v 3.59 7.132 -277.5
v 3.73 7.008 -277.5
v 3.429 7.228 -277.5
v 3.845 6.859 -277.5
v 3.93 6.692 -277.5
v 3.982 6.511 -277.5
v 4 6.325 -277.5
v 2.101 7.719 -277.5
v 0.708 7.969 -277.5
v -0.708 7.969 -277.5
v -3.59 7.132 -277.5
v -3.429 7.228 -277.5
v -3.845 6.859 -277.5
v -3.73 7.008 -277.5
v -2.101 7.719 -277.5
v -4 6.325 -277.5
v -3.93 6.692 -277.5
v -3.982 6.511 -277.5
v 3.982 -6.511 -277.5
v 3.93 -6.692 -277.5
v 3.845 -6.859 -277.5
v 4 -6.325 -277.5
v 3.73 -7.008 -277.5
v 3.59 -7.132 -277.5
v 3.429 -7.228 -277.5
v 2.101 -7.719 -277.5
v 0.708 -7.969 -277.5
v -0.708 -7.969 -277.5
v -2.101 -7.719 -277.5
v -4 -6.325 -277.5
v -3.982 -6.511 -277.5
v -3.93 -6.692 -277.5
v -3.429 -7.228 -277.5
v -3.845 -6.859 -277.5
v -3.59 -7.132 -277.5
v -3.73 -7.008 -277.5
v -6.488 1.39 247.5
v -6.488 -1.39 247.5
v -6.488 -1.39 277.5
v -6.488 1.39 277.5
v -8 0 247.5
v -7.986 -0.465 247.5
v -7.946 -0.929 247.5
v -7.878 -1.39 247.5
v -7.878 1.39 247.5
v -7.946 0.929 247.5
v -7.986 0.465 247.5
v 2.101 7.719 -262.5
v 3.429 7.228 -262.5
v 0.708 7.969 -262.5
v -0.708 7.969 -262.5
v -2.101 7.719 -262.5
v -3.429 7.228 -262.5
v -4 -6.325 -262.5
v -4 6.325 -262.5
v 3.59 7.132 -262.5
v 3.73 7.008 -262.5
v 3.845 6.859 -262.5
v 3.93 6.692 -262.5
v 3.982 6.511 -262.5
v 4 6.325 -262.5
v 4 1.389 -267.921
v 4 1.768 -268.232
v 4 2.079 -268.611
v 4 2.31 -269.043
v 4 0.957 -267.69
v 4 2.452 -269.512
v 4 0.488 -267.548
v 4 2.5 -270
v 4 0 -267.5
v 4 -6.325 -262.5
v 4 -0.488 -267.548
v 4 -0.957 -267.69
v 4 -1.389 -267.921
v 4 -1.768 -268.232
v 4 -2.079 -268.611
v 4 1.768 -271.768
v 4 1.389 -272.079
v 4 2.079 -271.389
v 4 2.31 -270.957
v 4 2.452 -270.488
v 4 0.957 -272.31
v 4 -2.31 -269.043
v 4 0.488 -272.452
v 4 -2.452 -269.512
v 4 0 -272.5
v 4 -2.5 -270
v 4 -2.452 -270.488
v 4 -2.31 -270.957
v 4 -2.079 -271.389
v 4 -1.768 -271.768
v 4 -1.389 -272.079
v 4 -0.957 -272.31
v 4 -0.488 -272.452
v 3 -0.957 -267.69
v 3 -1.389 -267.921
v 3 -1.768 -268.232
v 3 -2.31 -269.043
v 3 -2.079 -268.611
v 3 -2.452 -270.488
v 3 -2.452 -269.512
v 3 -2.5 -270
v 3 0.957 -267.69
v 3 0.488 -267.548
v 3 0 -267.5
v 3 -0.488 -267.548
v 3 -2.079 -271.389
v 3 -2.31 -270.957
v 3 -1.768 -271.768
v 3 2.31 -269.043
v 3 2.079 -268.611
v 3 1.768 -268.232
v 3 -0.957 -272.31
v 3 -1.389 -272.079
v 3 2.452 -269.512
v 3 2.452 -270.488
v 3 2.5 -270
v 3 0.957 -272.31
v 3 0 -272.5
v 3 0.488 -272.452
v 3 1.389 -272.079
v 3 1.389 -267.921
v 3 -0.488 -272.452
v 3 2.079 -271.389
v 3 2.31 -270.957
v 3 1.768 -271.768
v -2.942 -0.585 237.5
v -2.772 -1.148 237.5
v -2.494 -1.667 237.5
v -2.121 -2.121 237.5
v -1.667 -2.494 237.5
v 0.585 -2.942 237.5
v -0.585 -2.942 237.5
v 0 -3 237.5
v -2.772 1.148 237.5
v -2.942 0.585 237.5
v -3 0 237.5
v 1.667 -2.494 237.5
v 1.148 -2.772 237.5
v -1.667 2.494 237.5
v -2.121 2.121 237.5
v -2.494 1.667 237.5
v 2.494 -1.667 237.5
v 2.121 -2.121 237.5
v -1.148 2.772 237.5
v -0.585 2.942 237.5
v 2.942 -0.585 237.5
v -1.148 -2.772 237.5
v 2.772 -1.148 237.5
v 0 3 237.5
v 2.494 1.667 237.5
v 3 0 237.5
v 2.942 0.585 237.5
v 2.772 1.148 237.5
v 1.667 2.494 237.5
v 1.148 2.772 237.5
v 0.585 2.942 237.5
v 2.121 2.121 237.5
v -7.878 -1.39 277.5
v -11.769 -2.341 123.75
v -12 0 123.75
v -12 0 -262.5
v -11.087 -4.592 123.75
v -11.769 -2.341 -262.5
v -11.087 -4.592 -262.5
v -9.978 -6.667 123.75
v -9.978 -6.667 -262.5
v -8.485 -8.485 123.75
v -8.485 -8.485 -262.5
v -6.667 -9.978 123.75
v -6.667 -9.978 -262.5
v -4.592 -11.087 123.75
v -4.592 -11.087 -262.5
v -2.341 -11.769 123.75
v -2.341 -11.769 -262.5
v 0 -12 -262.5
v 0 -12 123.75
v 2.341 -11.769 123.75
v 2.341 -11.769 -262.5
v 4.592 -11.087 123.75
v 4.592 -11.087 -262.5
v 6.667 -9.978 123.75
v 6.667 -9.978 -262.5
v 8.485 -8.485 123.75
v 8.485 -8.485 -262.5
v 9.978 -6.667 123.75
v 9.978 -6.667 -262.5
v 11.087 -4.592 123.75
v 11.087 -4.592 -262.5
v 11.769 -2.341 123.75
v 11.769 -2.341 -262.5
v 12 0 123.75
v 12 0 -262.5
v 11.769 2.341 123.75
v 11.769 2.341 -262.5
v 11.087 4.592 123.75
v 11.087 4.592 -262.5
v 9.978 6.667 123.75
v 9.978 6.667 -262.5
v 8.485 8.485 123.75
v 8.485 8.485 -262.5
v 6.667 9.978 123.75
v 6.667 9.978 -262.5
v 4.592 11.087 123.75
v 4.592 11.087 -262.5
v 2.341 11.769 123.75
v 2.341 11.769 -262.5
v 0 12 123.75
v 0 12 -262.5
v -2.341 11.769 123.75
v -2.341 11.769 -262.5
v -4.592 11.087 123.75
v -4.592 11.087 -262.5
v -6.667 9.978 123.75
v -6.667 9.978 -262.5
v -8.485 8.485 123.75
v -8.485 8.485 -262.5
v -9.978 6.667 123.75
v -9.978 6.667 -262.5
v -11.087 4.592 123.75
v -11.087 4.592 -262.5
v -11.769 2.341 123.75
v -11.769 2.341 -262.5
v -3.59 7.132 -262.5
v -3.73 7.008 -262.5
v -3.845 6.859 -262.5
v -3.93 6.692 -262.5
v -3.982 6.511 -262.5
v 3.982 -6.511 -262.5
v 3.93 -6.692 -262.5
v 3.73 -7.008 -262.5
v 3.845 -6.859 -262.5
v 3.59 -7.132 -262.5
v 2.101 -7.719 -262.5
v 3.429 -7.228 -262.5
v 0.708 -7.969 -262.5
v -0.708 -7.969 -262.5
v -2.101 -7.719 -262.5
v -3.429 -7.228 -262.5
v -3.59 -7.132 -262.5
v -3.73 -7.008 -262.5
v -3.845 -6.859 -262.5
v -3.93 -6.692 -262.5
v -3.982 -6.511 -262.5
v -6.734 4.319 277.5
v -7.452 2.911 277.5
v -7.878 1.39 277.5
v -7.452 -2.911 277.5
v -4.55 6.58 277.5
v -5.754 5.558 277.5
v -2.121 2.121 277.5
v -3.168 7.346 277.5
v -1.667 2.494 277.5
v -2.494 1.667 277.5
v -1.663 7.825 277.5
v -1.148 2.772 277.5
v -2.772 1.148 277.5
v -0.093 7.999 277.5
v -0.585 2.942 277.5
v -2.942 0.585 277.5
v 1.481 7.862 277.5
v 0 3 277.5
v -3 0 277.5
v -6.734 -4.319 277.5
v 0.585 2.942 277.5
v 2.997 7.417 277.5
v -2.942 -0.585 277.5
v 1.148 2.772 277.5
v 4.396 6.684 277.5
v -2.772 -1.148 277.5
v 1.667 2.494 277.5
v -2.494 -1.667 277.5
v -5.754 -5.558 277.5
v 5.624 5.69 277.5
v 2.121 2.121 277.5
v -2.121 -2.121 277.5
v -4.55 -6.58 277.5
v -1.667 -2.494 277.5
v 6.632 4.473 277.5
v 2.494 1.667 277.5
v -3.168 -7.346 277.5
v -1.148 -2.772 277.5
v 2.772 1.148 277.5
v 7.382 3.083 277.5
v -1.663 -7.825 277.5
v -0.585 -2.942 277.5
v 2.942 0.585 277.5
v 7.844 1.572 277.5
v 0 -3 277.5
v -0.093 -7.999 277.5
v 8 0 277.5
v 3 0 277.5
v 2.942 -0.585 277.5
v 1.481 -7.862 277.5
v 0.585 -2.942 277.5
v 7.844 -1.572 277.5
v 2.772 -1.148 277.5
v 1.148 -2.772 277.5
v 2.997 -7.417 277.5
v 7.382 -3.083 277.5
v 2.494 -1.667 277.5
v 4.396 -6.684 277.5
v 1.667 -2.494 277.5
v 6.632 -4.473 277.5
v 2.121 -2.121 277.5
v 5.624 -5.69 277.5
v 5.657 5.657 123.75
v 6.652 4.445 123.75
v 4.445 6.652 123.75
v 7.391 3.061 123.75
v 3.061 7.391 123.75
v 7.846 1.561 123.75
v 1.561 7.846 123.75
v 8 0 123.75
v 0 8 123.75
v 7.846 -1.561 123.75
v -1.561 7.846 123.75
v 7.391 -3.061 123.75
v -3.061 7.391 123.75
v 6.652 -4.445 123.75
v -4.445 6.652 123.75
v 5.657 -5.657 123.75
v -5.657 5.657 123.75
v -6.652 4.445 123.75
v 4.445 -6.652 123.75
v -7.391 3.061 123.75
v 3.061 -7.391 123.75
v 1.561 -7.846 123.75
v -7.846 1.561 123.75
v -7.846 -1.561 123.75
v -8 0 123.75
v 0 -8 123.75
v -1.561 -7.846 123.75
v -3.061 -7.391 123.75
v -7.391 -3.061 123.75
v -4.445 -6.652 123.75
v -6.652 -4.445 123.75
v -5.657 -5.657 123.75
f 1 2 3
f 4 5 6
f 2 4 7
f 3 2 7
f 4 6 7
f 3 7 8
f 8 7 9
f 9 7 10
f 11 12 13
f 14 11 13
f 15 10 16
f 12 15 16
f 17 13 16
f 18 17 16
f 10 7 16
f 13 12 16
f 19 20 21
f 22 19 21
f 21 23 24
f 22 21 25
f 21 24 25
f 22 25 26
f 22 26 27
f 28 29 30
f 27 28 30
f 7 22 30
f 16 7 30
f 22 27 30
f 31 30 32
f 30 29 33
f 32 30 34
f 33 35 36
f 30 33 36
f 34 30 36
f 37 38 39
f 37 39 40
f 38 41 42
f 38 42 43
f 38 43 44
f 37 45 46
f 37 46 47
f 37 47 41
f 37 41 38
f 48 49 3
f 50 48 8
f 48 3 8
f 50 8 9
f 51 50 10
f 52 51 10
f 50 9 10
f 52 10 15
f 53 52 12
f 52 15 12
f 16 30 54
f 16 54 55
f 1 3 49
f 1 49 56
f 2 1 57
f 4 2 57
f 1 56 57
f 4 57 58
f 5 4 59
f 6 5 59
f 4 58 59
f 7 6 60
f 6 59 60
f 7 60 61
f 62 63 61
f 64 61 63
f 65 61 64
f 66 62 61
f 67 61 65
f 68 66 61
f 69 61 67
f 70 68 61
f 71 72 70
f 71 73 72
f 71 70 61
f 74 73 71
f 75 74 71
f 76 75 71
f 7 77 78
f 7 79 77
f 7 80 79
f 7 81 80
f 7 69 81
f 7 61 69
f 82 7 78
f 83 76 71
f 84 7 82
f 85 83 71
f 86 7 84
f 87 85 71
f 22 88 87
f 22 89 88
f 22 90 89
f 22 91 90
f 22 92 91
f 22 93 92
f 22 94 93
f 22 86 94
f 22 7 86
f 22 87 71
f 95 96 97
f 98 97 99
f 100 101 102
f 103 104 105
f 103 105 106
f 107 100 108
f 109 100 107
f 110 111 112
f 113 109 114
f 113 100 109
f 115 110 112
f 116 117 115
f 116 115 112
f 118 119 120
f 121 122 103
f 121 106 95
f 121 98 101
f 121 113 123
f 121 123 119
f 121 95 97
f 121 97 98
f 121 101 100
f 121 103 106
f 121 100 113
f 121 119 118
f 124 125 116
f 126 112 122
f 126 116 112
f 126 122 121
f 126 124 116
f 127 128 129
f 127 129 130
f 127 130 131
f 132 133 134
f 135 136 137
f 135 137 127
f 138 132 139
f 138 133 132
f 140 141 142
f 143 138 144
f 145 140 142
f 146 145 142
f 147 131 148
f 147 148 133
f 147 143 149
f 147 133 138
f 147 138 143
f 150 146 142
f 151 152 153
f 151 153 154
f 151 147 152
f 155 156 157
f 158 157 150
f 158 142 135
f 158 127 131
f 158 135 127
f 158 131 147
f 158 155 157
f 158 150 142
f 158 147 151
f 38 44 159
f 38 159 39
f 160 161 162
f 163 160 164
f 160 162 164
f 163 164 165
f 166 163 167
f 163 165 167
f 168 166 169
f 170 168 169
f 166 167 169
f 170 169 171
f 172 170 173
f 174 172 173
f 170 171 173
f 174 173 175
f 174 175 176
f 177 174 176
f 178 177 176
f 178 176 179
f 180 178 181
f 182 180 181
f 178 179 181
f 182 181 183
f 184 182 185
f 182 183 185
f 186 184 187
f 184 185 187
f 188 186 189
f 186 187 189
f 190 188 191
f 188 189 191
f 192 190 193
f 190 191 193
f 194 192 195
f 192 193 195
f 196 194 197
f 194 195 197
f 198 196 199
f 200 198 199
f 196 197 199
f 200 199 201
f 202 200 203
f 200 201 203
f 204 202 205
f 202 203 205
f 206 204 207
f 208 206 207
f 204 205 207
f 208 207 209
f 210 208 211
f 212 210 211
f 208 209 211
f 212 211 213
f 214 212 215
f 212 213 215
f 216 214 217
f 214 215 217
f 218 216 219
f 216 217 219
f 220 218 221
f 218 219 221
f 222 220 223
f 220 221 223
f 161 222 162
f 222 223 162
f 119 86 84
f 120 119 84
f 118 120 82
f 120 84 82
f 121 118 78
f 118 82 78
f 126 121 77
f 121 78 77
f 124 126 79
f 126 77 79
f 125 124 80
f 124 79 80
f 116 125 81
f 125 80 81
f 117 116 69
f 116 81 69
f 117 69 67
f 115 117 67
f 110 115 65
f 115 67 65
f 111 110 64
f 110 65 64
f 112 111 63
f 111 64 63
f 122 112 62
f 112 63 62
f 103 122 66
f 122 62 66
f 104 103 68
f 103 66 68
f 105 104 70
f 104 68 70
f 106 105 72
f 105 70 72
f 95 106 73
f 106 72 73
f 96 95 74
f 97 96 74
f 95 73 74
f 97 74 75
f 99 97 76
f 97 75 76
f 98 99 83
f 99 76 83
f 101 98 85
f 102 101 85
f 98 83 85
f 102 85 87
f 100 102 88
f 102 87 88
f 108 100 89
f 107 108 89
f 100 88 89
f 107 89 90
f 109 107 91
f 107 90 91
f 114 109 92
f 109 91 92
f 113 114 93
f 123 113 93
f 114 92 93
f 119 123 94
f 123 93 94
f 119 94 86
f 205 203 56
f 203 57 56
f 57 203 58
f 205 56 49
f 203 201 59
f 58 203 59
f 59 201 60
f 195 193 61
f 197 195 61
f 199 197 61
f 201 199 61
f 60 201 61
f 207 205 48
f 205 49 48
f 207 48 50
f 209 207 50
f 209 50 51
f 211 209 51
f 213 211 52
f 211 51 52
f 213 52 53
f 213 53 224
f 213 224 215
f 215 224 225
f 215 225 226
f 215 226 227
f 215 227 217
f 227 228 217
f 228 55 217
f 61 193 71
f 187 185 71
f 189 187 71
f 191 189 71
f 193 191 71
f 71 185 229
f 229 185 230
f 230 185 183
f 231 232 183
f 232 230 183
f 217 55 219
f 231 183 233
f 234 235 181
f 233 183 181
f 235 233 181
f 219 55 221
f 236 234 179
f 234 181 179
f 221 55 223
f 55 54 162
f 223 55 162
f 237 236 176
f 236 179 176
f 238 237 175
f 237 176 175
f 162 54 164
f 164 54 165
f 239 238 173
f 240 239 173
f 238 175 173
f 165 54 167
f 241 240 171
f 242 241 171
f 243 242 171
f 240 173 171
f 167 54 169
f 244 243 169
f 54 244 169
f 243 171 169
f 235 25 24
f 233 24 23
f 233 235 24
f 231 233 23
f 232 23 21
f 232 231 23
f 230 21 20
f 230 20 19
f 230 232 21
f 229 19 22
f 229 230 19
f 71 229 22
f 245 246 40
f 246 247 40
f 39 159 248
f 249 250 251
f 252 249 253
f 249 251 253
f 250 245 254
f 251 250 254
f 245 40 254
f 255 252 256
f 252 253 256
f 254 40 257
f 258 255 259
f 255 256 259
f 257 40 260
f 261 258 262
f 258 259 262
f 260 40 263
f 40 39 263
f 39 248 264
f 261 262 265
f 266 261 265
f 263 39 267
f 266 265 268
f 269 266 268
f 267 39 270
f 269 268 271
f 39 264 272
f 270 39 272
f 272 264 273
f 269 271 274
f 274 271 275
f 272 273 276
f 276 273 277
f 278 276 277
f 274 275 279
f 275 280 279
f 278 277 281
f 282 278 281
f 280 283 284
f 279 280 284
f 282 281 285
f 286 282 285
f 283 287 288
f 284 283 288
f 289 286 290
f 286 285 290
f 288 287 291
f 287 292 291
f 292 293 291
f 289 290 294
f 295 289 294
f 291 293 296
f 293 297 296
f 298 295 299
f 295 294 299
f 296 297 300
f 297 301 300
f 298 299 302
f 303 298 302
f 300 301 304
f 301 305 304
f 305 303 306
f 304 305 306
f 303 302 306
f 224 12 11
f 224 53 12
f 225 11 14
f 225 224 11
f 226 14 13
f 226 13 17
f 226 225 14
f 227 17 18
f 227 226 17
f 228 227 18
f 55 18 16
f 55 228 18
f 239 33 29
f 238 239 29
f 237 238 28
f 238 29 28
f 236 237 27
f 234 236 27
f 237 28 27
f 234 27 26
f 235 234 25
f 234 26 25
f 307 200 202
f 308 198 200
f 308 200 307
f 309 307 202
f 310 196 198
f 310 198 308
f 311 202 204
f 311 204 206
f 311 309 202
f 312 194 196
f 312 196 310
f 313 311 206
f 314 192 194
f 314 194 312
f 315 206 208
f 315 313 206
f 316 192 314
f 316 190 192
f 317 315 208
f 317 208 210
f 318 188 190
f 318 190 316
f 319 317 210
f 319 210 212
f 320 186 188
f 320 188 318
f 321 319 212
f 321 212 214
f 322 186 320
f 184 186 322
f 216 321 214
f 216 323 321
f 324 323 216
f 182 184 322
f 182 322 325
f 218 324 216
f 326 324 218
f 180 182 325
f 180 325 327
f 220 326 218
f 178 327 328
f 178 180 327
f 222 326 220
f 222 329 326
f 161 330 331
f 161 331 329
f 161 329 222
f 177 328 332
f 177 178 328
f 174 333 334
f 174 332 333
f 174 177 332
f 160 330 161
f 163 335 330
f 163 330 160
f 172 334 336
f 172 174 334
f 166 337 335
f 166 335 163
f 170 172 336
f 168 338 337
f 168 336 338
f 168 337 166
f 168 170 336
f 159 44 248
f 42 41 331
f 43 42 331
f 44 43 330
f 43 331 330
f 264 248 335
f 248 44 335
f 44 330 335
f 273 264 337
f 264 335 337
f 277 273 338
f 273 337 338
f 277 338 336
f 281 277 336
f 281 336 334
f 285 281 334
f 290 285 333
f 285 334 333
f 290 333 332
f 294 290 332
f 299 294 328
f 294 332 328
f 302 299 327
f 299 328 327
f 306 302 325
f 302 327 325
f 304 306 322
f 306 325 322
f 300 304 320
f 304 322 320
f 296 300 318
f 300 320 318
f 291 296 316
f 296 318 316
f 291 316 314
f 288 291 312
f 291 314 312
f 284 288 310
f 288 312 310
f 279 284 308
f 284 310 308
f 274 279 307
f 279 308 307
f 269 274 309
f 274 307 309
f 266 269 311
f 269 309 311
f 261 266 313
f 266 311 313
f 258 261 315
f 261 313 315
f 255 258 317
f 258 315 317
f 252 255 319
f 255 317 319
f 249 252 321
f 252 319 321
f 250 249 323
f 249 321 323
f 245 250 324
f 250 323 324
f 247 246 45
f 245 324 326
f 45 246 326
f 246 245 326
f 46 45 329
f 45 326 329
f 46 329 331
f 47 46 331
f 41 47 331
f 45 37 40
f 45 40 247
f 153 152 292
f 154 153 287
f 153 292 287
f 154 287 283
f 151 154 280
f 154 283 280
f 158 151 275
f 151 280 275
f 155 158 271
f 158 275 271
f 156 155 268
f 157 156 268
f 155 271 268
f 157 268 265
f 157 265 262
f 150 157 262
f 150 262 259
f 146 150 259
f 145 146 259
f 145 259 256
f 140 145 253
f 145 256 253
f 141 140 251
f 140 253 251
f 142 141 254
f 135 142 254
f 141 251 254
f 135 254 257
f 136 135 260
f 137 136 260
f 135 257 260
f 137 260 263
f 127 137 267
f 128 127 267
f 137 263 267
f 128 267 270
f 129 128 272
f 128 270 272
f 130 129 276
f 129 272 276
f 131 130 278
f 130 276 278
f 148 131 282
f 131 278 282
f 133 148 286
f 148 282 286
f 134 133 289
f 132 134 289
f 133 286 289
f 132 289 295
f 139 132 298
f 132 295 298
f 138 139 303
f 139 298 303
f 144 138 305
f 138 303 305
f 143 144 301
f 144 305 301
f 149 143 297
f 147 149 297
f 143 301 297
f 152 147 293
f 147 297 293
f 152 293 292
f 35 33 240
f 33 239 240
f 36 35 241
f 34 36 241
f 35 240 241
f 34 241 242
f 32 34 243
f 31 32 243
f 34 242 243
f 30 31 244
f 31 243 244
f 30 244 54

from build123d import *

# Parameters (mm, degrees)
CUT_EXTRUDE2_START = -30
CUT_EXTRUDE2_DEPTH = 30
SKETCH5_R          = 3
CUT_EXTRUDE3_DEPTH = 40
CUT_EXTRUDE4_START = -138.75
SKETCH6_R          = 12
SKETCH6_R_2        = 8
CUT_EXTRUDE4_DEPTH = 138.75
CUT_EXTRUDE5_DEPTH = 15
FILLET1_R          = 1
SKETCH8_R          = 2.5
CUT_EXTRUDE6_DEPTH = 1


with BuildPart() as part:
    # Sketch2 → Revolve2 (revolve)
    with BuildSketch(Plane(origin=(0, 0, 0), x_dir=(1, 0, 0), z_dir=(0, 1, 0)), mode=Mode.PRIVATE) as revolve2_sk:
        Polygon((0, -277.5), (8, -277.5), (8, -262.5), (12, -262.5), (12, 262.5), (8, 262.5), (8, 277.5), (0, 277.5), align=None)
    revolve(revolve2_sk.sketch.rotate(Axis((0, 0, -364.100348117), (0, 0, 1)), 180), axis=Axis((0, 0, -364.100348117), (0, 0, 1)))

    # Sketch4 → Cut-Extrude2 (cut)
    with BuildSketch(Plane.XY.offset(277.5).offset(CUT_EXTRUDE2_START)):
        with BuildLine():
            Line((-6.488318348, 1.39), (-7.878318348, 1.39))
            ThreePointArc((-7.878318348, 1.39), (-8, 0), (-7.878318348, -1.39))
            Line((-7.878318348, -1.39), (-6.488318348, -1.39))
            Line((-6.488318348, -1.39), (-6.488318348, 1.39))
        make_face()
    extrude(amount=CUT_EXTRUDE2_DEPTH, mode=Mode.SUBTRACT)

    # Sketch5 → Cut-Extrude3 (cut)
    with BuildSketch(Plane.XY.offset(277.5)):
        Circle(SKETCH5_R)
    extrude(amount=-CUT_EXTRUDE3_DEPTH, mode=Mode.SUBTRACT)

    # Sketch6 → Cut-Extrude4 (cut)
    with BuildSketch(Plane.XY.offset(262.5).offset(CUT_EXTRUDE4_START)):
        with Locations(Location((0, 0, 0), (0, 0, 180))):
            Circle(SKETCH6_R)
        with Locations(Location((0, 0, 0), (0, 0, 180))):
            Circle(SKETCH6_R_2, mode=Mode.SUBTRACT)
    extrude(amount=CUT_EXTRUDE4_DEPTH, mode=Mode.SUBTRACT)

    # Sketch7 → Cut-Extrude5 (cut)
    with BuildSketch(Plane(origin=(0, 0, -277.5), x_dir=(-1, 0, 0), z_dir=(0, 0, -1))):
        with BuildLine():
            Line((-4, 6.92820323), (-4, -6.92820323))
            ThreePointArc((-4, -6.92820323), (-8, 0), (-4, 6.92820323))
        make_face()
        with BuildLine():
            Line((4, -6.92820323), (4, 6.92820323))
            ThreePointArc((4, 6.92820323), (8, 0), (4, -6.92820323))
        make_face()
    extrude(amount=-CUT_EXTRUDE5_DEPTH, mode=Mode.SUBTRACT)

    # Fillet1
    fillet1_edges = [part.edges().sort_by_distance(p)[0] for p in [
        (4, 6.92820323, -270),
        (4, -6.92820323, -270),
        (-4, -6.92820323, -270),
        (-4, 6.92820323, -270),
    ]]
    fillet(fillet1_edges, radius=FILLET1_R)

    # Sketch8 → Cut-Extrude6 (cut)
    with BuildSketch(Plane(origin=(4, 0, 0), x_dir=(0, 0, -1), z_dir=(1, 0, 0))):
        with Locations((270, 0)):
            Circle(SKETCH8_R)
    extrude(amount=-CUT_EXTRUDE6_DEPTH, mode=Mode.SUBTRACT)


solid = part.part
